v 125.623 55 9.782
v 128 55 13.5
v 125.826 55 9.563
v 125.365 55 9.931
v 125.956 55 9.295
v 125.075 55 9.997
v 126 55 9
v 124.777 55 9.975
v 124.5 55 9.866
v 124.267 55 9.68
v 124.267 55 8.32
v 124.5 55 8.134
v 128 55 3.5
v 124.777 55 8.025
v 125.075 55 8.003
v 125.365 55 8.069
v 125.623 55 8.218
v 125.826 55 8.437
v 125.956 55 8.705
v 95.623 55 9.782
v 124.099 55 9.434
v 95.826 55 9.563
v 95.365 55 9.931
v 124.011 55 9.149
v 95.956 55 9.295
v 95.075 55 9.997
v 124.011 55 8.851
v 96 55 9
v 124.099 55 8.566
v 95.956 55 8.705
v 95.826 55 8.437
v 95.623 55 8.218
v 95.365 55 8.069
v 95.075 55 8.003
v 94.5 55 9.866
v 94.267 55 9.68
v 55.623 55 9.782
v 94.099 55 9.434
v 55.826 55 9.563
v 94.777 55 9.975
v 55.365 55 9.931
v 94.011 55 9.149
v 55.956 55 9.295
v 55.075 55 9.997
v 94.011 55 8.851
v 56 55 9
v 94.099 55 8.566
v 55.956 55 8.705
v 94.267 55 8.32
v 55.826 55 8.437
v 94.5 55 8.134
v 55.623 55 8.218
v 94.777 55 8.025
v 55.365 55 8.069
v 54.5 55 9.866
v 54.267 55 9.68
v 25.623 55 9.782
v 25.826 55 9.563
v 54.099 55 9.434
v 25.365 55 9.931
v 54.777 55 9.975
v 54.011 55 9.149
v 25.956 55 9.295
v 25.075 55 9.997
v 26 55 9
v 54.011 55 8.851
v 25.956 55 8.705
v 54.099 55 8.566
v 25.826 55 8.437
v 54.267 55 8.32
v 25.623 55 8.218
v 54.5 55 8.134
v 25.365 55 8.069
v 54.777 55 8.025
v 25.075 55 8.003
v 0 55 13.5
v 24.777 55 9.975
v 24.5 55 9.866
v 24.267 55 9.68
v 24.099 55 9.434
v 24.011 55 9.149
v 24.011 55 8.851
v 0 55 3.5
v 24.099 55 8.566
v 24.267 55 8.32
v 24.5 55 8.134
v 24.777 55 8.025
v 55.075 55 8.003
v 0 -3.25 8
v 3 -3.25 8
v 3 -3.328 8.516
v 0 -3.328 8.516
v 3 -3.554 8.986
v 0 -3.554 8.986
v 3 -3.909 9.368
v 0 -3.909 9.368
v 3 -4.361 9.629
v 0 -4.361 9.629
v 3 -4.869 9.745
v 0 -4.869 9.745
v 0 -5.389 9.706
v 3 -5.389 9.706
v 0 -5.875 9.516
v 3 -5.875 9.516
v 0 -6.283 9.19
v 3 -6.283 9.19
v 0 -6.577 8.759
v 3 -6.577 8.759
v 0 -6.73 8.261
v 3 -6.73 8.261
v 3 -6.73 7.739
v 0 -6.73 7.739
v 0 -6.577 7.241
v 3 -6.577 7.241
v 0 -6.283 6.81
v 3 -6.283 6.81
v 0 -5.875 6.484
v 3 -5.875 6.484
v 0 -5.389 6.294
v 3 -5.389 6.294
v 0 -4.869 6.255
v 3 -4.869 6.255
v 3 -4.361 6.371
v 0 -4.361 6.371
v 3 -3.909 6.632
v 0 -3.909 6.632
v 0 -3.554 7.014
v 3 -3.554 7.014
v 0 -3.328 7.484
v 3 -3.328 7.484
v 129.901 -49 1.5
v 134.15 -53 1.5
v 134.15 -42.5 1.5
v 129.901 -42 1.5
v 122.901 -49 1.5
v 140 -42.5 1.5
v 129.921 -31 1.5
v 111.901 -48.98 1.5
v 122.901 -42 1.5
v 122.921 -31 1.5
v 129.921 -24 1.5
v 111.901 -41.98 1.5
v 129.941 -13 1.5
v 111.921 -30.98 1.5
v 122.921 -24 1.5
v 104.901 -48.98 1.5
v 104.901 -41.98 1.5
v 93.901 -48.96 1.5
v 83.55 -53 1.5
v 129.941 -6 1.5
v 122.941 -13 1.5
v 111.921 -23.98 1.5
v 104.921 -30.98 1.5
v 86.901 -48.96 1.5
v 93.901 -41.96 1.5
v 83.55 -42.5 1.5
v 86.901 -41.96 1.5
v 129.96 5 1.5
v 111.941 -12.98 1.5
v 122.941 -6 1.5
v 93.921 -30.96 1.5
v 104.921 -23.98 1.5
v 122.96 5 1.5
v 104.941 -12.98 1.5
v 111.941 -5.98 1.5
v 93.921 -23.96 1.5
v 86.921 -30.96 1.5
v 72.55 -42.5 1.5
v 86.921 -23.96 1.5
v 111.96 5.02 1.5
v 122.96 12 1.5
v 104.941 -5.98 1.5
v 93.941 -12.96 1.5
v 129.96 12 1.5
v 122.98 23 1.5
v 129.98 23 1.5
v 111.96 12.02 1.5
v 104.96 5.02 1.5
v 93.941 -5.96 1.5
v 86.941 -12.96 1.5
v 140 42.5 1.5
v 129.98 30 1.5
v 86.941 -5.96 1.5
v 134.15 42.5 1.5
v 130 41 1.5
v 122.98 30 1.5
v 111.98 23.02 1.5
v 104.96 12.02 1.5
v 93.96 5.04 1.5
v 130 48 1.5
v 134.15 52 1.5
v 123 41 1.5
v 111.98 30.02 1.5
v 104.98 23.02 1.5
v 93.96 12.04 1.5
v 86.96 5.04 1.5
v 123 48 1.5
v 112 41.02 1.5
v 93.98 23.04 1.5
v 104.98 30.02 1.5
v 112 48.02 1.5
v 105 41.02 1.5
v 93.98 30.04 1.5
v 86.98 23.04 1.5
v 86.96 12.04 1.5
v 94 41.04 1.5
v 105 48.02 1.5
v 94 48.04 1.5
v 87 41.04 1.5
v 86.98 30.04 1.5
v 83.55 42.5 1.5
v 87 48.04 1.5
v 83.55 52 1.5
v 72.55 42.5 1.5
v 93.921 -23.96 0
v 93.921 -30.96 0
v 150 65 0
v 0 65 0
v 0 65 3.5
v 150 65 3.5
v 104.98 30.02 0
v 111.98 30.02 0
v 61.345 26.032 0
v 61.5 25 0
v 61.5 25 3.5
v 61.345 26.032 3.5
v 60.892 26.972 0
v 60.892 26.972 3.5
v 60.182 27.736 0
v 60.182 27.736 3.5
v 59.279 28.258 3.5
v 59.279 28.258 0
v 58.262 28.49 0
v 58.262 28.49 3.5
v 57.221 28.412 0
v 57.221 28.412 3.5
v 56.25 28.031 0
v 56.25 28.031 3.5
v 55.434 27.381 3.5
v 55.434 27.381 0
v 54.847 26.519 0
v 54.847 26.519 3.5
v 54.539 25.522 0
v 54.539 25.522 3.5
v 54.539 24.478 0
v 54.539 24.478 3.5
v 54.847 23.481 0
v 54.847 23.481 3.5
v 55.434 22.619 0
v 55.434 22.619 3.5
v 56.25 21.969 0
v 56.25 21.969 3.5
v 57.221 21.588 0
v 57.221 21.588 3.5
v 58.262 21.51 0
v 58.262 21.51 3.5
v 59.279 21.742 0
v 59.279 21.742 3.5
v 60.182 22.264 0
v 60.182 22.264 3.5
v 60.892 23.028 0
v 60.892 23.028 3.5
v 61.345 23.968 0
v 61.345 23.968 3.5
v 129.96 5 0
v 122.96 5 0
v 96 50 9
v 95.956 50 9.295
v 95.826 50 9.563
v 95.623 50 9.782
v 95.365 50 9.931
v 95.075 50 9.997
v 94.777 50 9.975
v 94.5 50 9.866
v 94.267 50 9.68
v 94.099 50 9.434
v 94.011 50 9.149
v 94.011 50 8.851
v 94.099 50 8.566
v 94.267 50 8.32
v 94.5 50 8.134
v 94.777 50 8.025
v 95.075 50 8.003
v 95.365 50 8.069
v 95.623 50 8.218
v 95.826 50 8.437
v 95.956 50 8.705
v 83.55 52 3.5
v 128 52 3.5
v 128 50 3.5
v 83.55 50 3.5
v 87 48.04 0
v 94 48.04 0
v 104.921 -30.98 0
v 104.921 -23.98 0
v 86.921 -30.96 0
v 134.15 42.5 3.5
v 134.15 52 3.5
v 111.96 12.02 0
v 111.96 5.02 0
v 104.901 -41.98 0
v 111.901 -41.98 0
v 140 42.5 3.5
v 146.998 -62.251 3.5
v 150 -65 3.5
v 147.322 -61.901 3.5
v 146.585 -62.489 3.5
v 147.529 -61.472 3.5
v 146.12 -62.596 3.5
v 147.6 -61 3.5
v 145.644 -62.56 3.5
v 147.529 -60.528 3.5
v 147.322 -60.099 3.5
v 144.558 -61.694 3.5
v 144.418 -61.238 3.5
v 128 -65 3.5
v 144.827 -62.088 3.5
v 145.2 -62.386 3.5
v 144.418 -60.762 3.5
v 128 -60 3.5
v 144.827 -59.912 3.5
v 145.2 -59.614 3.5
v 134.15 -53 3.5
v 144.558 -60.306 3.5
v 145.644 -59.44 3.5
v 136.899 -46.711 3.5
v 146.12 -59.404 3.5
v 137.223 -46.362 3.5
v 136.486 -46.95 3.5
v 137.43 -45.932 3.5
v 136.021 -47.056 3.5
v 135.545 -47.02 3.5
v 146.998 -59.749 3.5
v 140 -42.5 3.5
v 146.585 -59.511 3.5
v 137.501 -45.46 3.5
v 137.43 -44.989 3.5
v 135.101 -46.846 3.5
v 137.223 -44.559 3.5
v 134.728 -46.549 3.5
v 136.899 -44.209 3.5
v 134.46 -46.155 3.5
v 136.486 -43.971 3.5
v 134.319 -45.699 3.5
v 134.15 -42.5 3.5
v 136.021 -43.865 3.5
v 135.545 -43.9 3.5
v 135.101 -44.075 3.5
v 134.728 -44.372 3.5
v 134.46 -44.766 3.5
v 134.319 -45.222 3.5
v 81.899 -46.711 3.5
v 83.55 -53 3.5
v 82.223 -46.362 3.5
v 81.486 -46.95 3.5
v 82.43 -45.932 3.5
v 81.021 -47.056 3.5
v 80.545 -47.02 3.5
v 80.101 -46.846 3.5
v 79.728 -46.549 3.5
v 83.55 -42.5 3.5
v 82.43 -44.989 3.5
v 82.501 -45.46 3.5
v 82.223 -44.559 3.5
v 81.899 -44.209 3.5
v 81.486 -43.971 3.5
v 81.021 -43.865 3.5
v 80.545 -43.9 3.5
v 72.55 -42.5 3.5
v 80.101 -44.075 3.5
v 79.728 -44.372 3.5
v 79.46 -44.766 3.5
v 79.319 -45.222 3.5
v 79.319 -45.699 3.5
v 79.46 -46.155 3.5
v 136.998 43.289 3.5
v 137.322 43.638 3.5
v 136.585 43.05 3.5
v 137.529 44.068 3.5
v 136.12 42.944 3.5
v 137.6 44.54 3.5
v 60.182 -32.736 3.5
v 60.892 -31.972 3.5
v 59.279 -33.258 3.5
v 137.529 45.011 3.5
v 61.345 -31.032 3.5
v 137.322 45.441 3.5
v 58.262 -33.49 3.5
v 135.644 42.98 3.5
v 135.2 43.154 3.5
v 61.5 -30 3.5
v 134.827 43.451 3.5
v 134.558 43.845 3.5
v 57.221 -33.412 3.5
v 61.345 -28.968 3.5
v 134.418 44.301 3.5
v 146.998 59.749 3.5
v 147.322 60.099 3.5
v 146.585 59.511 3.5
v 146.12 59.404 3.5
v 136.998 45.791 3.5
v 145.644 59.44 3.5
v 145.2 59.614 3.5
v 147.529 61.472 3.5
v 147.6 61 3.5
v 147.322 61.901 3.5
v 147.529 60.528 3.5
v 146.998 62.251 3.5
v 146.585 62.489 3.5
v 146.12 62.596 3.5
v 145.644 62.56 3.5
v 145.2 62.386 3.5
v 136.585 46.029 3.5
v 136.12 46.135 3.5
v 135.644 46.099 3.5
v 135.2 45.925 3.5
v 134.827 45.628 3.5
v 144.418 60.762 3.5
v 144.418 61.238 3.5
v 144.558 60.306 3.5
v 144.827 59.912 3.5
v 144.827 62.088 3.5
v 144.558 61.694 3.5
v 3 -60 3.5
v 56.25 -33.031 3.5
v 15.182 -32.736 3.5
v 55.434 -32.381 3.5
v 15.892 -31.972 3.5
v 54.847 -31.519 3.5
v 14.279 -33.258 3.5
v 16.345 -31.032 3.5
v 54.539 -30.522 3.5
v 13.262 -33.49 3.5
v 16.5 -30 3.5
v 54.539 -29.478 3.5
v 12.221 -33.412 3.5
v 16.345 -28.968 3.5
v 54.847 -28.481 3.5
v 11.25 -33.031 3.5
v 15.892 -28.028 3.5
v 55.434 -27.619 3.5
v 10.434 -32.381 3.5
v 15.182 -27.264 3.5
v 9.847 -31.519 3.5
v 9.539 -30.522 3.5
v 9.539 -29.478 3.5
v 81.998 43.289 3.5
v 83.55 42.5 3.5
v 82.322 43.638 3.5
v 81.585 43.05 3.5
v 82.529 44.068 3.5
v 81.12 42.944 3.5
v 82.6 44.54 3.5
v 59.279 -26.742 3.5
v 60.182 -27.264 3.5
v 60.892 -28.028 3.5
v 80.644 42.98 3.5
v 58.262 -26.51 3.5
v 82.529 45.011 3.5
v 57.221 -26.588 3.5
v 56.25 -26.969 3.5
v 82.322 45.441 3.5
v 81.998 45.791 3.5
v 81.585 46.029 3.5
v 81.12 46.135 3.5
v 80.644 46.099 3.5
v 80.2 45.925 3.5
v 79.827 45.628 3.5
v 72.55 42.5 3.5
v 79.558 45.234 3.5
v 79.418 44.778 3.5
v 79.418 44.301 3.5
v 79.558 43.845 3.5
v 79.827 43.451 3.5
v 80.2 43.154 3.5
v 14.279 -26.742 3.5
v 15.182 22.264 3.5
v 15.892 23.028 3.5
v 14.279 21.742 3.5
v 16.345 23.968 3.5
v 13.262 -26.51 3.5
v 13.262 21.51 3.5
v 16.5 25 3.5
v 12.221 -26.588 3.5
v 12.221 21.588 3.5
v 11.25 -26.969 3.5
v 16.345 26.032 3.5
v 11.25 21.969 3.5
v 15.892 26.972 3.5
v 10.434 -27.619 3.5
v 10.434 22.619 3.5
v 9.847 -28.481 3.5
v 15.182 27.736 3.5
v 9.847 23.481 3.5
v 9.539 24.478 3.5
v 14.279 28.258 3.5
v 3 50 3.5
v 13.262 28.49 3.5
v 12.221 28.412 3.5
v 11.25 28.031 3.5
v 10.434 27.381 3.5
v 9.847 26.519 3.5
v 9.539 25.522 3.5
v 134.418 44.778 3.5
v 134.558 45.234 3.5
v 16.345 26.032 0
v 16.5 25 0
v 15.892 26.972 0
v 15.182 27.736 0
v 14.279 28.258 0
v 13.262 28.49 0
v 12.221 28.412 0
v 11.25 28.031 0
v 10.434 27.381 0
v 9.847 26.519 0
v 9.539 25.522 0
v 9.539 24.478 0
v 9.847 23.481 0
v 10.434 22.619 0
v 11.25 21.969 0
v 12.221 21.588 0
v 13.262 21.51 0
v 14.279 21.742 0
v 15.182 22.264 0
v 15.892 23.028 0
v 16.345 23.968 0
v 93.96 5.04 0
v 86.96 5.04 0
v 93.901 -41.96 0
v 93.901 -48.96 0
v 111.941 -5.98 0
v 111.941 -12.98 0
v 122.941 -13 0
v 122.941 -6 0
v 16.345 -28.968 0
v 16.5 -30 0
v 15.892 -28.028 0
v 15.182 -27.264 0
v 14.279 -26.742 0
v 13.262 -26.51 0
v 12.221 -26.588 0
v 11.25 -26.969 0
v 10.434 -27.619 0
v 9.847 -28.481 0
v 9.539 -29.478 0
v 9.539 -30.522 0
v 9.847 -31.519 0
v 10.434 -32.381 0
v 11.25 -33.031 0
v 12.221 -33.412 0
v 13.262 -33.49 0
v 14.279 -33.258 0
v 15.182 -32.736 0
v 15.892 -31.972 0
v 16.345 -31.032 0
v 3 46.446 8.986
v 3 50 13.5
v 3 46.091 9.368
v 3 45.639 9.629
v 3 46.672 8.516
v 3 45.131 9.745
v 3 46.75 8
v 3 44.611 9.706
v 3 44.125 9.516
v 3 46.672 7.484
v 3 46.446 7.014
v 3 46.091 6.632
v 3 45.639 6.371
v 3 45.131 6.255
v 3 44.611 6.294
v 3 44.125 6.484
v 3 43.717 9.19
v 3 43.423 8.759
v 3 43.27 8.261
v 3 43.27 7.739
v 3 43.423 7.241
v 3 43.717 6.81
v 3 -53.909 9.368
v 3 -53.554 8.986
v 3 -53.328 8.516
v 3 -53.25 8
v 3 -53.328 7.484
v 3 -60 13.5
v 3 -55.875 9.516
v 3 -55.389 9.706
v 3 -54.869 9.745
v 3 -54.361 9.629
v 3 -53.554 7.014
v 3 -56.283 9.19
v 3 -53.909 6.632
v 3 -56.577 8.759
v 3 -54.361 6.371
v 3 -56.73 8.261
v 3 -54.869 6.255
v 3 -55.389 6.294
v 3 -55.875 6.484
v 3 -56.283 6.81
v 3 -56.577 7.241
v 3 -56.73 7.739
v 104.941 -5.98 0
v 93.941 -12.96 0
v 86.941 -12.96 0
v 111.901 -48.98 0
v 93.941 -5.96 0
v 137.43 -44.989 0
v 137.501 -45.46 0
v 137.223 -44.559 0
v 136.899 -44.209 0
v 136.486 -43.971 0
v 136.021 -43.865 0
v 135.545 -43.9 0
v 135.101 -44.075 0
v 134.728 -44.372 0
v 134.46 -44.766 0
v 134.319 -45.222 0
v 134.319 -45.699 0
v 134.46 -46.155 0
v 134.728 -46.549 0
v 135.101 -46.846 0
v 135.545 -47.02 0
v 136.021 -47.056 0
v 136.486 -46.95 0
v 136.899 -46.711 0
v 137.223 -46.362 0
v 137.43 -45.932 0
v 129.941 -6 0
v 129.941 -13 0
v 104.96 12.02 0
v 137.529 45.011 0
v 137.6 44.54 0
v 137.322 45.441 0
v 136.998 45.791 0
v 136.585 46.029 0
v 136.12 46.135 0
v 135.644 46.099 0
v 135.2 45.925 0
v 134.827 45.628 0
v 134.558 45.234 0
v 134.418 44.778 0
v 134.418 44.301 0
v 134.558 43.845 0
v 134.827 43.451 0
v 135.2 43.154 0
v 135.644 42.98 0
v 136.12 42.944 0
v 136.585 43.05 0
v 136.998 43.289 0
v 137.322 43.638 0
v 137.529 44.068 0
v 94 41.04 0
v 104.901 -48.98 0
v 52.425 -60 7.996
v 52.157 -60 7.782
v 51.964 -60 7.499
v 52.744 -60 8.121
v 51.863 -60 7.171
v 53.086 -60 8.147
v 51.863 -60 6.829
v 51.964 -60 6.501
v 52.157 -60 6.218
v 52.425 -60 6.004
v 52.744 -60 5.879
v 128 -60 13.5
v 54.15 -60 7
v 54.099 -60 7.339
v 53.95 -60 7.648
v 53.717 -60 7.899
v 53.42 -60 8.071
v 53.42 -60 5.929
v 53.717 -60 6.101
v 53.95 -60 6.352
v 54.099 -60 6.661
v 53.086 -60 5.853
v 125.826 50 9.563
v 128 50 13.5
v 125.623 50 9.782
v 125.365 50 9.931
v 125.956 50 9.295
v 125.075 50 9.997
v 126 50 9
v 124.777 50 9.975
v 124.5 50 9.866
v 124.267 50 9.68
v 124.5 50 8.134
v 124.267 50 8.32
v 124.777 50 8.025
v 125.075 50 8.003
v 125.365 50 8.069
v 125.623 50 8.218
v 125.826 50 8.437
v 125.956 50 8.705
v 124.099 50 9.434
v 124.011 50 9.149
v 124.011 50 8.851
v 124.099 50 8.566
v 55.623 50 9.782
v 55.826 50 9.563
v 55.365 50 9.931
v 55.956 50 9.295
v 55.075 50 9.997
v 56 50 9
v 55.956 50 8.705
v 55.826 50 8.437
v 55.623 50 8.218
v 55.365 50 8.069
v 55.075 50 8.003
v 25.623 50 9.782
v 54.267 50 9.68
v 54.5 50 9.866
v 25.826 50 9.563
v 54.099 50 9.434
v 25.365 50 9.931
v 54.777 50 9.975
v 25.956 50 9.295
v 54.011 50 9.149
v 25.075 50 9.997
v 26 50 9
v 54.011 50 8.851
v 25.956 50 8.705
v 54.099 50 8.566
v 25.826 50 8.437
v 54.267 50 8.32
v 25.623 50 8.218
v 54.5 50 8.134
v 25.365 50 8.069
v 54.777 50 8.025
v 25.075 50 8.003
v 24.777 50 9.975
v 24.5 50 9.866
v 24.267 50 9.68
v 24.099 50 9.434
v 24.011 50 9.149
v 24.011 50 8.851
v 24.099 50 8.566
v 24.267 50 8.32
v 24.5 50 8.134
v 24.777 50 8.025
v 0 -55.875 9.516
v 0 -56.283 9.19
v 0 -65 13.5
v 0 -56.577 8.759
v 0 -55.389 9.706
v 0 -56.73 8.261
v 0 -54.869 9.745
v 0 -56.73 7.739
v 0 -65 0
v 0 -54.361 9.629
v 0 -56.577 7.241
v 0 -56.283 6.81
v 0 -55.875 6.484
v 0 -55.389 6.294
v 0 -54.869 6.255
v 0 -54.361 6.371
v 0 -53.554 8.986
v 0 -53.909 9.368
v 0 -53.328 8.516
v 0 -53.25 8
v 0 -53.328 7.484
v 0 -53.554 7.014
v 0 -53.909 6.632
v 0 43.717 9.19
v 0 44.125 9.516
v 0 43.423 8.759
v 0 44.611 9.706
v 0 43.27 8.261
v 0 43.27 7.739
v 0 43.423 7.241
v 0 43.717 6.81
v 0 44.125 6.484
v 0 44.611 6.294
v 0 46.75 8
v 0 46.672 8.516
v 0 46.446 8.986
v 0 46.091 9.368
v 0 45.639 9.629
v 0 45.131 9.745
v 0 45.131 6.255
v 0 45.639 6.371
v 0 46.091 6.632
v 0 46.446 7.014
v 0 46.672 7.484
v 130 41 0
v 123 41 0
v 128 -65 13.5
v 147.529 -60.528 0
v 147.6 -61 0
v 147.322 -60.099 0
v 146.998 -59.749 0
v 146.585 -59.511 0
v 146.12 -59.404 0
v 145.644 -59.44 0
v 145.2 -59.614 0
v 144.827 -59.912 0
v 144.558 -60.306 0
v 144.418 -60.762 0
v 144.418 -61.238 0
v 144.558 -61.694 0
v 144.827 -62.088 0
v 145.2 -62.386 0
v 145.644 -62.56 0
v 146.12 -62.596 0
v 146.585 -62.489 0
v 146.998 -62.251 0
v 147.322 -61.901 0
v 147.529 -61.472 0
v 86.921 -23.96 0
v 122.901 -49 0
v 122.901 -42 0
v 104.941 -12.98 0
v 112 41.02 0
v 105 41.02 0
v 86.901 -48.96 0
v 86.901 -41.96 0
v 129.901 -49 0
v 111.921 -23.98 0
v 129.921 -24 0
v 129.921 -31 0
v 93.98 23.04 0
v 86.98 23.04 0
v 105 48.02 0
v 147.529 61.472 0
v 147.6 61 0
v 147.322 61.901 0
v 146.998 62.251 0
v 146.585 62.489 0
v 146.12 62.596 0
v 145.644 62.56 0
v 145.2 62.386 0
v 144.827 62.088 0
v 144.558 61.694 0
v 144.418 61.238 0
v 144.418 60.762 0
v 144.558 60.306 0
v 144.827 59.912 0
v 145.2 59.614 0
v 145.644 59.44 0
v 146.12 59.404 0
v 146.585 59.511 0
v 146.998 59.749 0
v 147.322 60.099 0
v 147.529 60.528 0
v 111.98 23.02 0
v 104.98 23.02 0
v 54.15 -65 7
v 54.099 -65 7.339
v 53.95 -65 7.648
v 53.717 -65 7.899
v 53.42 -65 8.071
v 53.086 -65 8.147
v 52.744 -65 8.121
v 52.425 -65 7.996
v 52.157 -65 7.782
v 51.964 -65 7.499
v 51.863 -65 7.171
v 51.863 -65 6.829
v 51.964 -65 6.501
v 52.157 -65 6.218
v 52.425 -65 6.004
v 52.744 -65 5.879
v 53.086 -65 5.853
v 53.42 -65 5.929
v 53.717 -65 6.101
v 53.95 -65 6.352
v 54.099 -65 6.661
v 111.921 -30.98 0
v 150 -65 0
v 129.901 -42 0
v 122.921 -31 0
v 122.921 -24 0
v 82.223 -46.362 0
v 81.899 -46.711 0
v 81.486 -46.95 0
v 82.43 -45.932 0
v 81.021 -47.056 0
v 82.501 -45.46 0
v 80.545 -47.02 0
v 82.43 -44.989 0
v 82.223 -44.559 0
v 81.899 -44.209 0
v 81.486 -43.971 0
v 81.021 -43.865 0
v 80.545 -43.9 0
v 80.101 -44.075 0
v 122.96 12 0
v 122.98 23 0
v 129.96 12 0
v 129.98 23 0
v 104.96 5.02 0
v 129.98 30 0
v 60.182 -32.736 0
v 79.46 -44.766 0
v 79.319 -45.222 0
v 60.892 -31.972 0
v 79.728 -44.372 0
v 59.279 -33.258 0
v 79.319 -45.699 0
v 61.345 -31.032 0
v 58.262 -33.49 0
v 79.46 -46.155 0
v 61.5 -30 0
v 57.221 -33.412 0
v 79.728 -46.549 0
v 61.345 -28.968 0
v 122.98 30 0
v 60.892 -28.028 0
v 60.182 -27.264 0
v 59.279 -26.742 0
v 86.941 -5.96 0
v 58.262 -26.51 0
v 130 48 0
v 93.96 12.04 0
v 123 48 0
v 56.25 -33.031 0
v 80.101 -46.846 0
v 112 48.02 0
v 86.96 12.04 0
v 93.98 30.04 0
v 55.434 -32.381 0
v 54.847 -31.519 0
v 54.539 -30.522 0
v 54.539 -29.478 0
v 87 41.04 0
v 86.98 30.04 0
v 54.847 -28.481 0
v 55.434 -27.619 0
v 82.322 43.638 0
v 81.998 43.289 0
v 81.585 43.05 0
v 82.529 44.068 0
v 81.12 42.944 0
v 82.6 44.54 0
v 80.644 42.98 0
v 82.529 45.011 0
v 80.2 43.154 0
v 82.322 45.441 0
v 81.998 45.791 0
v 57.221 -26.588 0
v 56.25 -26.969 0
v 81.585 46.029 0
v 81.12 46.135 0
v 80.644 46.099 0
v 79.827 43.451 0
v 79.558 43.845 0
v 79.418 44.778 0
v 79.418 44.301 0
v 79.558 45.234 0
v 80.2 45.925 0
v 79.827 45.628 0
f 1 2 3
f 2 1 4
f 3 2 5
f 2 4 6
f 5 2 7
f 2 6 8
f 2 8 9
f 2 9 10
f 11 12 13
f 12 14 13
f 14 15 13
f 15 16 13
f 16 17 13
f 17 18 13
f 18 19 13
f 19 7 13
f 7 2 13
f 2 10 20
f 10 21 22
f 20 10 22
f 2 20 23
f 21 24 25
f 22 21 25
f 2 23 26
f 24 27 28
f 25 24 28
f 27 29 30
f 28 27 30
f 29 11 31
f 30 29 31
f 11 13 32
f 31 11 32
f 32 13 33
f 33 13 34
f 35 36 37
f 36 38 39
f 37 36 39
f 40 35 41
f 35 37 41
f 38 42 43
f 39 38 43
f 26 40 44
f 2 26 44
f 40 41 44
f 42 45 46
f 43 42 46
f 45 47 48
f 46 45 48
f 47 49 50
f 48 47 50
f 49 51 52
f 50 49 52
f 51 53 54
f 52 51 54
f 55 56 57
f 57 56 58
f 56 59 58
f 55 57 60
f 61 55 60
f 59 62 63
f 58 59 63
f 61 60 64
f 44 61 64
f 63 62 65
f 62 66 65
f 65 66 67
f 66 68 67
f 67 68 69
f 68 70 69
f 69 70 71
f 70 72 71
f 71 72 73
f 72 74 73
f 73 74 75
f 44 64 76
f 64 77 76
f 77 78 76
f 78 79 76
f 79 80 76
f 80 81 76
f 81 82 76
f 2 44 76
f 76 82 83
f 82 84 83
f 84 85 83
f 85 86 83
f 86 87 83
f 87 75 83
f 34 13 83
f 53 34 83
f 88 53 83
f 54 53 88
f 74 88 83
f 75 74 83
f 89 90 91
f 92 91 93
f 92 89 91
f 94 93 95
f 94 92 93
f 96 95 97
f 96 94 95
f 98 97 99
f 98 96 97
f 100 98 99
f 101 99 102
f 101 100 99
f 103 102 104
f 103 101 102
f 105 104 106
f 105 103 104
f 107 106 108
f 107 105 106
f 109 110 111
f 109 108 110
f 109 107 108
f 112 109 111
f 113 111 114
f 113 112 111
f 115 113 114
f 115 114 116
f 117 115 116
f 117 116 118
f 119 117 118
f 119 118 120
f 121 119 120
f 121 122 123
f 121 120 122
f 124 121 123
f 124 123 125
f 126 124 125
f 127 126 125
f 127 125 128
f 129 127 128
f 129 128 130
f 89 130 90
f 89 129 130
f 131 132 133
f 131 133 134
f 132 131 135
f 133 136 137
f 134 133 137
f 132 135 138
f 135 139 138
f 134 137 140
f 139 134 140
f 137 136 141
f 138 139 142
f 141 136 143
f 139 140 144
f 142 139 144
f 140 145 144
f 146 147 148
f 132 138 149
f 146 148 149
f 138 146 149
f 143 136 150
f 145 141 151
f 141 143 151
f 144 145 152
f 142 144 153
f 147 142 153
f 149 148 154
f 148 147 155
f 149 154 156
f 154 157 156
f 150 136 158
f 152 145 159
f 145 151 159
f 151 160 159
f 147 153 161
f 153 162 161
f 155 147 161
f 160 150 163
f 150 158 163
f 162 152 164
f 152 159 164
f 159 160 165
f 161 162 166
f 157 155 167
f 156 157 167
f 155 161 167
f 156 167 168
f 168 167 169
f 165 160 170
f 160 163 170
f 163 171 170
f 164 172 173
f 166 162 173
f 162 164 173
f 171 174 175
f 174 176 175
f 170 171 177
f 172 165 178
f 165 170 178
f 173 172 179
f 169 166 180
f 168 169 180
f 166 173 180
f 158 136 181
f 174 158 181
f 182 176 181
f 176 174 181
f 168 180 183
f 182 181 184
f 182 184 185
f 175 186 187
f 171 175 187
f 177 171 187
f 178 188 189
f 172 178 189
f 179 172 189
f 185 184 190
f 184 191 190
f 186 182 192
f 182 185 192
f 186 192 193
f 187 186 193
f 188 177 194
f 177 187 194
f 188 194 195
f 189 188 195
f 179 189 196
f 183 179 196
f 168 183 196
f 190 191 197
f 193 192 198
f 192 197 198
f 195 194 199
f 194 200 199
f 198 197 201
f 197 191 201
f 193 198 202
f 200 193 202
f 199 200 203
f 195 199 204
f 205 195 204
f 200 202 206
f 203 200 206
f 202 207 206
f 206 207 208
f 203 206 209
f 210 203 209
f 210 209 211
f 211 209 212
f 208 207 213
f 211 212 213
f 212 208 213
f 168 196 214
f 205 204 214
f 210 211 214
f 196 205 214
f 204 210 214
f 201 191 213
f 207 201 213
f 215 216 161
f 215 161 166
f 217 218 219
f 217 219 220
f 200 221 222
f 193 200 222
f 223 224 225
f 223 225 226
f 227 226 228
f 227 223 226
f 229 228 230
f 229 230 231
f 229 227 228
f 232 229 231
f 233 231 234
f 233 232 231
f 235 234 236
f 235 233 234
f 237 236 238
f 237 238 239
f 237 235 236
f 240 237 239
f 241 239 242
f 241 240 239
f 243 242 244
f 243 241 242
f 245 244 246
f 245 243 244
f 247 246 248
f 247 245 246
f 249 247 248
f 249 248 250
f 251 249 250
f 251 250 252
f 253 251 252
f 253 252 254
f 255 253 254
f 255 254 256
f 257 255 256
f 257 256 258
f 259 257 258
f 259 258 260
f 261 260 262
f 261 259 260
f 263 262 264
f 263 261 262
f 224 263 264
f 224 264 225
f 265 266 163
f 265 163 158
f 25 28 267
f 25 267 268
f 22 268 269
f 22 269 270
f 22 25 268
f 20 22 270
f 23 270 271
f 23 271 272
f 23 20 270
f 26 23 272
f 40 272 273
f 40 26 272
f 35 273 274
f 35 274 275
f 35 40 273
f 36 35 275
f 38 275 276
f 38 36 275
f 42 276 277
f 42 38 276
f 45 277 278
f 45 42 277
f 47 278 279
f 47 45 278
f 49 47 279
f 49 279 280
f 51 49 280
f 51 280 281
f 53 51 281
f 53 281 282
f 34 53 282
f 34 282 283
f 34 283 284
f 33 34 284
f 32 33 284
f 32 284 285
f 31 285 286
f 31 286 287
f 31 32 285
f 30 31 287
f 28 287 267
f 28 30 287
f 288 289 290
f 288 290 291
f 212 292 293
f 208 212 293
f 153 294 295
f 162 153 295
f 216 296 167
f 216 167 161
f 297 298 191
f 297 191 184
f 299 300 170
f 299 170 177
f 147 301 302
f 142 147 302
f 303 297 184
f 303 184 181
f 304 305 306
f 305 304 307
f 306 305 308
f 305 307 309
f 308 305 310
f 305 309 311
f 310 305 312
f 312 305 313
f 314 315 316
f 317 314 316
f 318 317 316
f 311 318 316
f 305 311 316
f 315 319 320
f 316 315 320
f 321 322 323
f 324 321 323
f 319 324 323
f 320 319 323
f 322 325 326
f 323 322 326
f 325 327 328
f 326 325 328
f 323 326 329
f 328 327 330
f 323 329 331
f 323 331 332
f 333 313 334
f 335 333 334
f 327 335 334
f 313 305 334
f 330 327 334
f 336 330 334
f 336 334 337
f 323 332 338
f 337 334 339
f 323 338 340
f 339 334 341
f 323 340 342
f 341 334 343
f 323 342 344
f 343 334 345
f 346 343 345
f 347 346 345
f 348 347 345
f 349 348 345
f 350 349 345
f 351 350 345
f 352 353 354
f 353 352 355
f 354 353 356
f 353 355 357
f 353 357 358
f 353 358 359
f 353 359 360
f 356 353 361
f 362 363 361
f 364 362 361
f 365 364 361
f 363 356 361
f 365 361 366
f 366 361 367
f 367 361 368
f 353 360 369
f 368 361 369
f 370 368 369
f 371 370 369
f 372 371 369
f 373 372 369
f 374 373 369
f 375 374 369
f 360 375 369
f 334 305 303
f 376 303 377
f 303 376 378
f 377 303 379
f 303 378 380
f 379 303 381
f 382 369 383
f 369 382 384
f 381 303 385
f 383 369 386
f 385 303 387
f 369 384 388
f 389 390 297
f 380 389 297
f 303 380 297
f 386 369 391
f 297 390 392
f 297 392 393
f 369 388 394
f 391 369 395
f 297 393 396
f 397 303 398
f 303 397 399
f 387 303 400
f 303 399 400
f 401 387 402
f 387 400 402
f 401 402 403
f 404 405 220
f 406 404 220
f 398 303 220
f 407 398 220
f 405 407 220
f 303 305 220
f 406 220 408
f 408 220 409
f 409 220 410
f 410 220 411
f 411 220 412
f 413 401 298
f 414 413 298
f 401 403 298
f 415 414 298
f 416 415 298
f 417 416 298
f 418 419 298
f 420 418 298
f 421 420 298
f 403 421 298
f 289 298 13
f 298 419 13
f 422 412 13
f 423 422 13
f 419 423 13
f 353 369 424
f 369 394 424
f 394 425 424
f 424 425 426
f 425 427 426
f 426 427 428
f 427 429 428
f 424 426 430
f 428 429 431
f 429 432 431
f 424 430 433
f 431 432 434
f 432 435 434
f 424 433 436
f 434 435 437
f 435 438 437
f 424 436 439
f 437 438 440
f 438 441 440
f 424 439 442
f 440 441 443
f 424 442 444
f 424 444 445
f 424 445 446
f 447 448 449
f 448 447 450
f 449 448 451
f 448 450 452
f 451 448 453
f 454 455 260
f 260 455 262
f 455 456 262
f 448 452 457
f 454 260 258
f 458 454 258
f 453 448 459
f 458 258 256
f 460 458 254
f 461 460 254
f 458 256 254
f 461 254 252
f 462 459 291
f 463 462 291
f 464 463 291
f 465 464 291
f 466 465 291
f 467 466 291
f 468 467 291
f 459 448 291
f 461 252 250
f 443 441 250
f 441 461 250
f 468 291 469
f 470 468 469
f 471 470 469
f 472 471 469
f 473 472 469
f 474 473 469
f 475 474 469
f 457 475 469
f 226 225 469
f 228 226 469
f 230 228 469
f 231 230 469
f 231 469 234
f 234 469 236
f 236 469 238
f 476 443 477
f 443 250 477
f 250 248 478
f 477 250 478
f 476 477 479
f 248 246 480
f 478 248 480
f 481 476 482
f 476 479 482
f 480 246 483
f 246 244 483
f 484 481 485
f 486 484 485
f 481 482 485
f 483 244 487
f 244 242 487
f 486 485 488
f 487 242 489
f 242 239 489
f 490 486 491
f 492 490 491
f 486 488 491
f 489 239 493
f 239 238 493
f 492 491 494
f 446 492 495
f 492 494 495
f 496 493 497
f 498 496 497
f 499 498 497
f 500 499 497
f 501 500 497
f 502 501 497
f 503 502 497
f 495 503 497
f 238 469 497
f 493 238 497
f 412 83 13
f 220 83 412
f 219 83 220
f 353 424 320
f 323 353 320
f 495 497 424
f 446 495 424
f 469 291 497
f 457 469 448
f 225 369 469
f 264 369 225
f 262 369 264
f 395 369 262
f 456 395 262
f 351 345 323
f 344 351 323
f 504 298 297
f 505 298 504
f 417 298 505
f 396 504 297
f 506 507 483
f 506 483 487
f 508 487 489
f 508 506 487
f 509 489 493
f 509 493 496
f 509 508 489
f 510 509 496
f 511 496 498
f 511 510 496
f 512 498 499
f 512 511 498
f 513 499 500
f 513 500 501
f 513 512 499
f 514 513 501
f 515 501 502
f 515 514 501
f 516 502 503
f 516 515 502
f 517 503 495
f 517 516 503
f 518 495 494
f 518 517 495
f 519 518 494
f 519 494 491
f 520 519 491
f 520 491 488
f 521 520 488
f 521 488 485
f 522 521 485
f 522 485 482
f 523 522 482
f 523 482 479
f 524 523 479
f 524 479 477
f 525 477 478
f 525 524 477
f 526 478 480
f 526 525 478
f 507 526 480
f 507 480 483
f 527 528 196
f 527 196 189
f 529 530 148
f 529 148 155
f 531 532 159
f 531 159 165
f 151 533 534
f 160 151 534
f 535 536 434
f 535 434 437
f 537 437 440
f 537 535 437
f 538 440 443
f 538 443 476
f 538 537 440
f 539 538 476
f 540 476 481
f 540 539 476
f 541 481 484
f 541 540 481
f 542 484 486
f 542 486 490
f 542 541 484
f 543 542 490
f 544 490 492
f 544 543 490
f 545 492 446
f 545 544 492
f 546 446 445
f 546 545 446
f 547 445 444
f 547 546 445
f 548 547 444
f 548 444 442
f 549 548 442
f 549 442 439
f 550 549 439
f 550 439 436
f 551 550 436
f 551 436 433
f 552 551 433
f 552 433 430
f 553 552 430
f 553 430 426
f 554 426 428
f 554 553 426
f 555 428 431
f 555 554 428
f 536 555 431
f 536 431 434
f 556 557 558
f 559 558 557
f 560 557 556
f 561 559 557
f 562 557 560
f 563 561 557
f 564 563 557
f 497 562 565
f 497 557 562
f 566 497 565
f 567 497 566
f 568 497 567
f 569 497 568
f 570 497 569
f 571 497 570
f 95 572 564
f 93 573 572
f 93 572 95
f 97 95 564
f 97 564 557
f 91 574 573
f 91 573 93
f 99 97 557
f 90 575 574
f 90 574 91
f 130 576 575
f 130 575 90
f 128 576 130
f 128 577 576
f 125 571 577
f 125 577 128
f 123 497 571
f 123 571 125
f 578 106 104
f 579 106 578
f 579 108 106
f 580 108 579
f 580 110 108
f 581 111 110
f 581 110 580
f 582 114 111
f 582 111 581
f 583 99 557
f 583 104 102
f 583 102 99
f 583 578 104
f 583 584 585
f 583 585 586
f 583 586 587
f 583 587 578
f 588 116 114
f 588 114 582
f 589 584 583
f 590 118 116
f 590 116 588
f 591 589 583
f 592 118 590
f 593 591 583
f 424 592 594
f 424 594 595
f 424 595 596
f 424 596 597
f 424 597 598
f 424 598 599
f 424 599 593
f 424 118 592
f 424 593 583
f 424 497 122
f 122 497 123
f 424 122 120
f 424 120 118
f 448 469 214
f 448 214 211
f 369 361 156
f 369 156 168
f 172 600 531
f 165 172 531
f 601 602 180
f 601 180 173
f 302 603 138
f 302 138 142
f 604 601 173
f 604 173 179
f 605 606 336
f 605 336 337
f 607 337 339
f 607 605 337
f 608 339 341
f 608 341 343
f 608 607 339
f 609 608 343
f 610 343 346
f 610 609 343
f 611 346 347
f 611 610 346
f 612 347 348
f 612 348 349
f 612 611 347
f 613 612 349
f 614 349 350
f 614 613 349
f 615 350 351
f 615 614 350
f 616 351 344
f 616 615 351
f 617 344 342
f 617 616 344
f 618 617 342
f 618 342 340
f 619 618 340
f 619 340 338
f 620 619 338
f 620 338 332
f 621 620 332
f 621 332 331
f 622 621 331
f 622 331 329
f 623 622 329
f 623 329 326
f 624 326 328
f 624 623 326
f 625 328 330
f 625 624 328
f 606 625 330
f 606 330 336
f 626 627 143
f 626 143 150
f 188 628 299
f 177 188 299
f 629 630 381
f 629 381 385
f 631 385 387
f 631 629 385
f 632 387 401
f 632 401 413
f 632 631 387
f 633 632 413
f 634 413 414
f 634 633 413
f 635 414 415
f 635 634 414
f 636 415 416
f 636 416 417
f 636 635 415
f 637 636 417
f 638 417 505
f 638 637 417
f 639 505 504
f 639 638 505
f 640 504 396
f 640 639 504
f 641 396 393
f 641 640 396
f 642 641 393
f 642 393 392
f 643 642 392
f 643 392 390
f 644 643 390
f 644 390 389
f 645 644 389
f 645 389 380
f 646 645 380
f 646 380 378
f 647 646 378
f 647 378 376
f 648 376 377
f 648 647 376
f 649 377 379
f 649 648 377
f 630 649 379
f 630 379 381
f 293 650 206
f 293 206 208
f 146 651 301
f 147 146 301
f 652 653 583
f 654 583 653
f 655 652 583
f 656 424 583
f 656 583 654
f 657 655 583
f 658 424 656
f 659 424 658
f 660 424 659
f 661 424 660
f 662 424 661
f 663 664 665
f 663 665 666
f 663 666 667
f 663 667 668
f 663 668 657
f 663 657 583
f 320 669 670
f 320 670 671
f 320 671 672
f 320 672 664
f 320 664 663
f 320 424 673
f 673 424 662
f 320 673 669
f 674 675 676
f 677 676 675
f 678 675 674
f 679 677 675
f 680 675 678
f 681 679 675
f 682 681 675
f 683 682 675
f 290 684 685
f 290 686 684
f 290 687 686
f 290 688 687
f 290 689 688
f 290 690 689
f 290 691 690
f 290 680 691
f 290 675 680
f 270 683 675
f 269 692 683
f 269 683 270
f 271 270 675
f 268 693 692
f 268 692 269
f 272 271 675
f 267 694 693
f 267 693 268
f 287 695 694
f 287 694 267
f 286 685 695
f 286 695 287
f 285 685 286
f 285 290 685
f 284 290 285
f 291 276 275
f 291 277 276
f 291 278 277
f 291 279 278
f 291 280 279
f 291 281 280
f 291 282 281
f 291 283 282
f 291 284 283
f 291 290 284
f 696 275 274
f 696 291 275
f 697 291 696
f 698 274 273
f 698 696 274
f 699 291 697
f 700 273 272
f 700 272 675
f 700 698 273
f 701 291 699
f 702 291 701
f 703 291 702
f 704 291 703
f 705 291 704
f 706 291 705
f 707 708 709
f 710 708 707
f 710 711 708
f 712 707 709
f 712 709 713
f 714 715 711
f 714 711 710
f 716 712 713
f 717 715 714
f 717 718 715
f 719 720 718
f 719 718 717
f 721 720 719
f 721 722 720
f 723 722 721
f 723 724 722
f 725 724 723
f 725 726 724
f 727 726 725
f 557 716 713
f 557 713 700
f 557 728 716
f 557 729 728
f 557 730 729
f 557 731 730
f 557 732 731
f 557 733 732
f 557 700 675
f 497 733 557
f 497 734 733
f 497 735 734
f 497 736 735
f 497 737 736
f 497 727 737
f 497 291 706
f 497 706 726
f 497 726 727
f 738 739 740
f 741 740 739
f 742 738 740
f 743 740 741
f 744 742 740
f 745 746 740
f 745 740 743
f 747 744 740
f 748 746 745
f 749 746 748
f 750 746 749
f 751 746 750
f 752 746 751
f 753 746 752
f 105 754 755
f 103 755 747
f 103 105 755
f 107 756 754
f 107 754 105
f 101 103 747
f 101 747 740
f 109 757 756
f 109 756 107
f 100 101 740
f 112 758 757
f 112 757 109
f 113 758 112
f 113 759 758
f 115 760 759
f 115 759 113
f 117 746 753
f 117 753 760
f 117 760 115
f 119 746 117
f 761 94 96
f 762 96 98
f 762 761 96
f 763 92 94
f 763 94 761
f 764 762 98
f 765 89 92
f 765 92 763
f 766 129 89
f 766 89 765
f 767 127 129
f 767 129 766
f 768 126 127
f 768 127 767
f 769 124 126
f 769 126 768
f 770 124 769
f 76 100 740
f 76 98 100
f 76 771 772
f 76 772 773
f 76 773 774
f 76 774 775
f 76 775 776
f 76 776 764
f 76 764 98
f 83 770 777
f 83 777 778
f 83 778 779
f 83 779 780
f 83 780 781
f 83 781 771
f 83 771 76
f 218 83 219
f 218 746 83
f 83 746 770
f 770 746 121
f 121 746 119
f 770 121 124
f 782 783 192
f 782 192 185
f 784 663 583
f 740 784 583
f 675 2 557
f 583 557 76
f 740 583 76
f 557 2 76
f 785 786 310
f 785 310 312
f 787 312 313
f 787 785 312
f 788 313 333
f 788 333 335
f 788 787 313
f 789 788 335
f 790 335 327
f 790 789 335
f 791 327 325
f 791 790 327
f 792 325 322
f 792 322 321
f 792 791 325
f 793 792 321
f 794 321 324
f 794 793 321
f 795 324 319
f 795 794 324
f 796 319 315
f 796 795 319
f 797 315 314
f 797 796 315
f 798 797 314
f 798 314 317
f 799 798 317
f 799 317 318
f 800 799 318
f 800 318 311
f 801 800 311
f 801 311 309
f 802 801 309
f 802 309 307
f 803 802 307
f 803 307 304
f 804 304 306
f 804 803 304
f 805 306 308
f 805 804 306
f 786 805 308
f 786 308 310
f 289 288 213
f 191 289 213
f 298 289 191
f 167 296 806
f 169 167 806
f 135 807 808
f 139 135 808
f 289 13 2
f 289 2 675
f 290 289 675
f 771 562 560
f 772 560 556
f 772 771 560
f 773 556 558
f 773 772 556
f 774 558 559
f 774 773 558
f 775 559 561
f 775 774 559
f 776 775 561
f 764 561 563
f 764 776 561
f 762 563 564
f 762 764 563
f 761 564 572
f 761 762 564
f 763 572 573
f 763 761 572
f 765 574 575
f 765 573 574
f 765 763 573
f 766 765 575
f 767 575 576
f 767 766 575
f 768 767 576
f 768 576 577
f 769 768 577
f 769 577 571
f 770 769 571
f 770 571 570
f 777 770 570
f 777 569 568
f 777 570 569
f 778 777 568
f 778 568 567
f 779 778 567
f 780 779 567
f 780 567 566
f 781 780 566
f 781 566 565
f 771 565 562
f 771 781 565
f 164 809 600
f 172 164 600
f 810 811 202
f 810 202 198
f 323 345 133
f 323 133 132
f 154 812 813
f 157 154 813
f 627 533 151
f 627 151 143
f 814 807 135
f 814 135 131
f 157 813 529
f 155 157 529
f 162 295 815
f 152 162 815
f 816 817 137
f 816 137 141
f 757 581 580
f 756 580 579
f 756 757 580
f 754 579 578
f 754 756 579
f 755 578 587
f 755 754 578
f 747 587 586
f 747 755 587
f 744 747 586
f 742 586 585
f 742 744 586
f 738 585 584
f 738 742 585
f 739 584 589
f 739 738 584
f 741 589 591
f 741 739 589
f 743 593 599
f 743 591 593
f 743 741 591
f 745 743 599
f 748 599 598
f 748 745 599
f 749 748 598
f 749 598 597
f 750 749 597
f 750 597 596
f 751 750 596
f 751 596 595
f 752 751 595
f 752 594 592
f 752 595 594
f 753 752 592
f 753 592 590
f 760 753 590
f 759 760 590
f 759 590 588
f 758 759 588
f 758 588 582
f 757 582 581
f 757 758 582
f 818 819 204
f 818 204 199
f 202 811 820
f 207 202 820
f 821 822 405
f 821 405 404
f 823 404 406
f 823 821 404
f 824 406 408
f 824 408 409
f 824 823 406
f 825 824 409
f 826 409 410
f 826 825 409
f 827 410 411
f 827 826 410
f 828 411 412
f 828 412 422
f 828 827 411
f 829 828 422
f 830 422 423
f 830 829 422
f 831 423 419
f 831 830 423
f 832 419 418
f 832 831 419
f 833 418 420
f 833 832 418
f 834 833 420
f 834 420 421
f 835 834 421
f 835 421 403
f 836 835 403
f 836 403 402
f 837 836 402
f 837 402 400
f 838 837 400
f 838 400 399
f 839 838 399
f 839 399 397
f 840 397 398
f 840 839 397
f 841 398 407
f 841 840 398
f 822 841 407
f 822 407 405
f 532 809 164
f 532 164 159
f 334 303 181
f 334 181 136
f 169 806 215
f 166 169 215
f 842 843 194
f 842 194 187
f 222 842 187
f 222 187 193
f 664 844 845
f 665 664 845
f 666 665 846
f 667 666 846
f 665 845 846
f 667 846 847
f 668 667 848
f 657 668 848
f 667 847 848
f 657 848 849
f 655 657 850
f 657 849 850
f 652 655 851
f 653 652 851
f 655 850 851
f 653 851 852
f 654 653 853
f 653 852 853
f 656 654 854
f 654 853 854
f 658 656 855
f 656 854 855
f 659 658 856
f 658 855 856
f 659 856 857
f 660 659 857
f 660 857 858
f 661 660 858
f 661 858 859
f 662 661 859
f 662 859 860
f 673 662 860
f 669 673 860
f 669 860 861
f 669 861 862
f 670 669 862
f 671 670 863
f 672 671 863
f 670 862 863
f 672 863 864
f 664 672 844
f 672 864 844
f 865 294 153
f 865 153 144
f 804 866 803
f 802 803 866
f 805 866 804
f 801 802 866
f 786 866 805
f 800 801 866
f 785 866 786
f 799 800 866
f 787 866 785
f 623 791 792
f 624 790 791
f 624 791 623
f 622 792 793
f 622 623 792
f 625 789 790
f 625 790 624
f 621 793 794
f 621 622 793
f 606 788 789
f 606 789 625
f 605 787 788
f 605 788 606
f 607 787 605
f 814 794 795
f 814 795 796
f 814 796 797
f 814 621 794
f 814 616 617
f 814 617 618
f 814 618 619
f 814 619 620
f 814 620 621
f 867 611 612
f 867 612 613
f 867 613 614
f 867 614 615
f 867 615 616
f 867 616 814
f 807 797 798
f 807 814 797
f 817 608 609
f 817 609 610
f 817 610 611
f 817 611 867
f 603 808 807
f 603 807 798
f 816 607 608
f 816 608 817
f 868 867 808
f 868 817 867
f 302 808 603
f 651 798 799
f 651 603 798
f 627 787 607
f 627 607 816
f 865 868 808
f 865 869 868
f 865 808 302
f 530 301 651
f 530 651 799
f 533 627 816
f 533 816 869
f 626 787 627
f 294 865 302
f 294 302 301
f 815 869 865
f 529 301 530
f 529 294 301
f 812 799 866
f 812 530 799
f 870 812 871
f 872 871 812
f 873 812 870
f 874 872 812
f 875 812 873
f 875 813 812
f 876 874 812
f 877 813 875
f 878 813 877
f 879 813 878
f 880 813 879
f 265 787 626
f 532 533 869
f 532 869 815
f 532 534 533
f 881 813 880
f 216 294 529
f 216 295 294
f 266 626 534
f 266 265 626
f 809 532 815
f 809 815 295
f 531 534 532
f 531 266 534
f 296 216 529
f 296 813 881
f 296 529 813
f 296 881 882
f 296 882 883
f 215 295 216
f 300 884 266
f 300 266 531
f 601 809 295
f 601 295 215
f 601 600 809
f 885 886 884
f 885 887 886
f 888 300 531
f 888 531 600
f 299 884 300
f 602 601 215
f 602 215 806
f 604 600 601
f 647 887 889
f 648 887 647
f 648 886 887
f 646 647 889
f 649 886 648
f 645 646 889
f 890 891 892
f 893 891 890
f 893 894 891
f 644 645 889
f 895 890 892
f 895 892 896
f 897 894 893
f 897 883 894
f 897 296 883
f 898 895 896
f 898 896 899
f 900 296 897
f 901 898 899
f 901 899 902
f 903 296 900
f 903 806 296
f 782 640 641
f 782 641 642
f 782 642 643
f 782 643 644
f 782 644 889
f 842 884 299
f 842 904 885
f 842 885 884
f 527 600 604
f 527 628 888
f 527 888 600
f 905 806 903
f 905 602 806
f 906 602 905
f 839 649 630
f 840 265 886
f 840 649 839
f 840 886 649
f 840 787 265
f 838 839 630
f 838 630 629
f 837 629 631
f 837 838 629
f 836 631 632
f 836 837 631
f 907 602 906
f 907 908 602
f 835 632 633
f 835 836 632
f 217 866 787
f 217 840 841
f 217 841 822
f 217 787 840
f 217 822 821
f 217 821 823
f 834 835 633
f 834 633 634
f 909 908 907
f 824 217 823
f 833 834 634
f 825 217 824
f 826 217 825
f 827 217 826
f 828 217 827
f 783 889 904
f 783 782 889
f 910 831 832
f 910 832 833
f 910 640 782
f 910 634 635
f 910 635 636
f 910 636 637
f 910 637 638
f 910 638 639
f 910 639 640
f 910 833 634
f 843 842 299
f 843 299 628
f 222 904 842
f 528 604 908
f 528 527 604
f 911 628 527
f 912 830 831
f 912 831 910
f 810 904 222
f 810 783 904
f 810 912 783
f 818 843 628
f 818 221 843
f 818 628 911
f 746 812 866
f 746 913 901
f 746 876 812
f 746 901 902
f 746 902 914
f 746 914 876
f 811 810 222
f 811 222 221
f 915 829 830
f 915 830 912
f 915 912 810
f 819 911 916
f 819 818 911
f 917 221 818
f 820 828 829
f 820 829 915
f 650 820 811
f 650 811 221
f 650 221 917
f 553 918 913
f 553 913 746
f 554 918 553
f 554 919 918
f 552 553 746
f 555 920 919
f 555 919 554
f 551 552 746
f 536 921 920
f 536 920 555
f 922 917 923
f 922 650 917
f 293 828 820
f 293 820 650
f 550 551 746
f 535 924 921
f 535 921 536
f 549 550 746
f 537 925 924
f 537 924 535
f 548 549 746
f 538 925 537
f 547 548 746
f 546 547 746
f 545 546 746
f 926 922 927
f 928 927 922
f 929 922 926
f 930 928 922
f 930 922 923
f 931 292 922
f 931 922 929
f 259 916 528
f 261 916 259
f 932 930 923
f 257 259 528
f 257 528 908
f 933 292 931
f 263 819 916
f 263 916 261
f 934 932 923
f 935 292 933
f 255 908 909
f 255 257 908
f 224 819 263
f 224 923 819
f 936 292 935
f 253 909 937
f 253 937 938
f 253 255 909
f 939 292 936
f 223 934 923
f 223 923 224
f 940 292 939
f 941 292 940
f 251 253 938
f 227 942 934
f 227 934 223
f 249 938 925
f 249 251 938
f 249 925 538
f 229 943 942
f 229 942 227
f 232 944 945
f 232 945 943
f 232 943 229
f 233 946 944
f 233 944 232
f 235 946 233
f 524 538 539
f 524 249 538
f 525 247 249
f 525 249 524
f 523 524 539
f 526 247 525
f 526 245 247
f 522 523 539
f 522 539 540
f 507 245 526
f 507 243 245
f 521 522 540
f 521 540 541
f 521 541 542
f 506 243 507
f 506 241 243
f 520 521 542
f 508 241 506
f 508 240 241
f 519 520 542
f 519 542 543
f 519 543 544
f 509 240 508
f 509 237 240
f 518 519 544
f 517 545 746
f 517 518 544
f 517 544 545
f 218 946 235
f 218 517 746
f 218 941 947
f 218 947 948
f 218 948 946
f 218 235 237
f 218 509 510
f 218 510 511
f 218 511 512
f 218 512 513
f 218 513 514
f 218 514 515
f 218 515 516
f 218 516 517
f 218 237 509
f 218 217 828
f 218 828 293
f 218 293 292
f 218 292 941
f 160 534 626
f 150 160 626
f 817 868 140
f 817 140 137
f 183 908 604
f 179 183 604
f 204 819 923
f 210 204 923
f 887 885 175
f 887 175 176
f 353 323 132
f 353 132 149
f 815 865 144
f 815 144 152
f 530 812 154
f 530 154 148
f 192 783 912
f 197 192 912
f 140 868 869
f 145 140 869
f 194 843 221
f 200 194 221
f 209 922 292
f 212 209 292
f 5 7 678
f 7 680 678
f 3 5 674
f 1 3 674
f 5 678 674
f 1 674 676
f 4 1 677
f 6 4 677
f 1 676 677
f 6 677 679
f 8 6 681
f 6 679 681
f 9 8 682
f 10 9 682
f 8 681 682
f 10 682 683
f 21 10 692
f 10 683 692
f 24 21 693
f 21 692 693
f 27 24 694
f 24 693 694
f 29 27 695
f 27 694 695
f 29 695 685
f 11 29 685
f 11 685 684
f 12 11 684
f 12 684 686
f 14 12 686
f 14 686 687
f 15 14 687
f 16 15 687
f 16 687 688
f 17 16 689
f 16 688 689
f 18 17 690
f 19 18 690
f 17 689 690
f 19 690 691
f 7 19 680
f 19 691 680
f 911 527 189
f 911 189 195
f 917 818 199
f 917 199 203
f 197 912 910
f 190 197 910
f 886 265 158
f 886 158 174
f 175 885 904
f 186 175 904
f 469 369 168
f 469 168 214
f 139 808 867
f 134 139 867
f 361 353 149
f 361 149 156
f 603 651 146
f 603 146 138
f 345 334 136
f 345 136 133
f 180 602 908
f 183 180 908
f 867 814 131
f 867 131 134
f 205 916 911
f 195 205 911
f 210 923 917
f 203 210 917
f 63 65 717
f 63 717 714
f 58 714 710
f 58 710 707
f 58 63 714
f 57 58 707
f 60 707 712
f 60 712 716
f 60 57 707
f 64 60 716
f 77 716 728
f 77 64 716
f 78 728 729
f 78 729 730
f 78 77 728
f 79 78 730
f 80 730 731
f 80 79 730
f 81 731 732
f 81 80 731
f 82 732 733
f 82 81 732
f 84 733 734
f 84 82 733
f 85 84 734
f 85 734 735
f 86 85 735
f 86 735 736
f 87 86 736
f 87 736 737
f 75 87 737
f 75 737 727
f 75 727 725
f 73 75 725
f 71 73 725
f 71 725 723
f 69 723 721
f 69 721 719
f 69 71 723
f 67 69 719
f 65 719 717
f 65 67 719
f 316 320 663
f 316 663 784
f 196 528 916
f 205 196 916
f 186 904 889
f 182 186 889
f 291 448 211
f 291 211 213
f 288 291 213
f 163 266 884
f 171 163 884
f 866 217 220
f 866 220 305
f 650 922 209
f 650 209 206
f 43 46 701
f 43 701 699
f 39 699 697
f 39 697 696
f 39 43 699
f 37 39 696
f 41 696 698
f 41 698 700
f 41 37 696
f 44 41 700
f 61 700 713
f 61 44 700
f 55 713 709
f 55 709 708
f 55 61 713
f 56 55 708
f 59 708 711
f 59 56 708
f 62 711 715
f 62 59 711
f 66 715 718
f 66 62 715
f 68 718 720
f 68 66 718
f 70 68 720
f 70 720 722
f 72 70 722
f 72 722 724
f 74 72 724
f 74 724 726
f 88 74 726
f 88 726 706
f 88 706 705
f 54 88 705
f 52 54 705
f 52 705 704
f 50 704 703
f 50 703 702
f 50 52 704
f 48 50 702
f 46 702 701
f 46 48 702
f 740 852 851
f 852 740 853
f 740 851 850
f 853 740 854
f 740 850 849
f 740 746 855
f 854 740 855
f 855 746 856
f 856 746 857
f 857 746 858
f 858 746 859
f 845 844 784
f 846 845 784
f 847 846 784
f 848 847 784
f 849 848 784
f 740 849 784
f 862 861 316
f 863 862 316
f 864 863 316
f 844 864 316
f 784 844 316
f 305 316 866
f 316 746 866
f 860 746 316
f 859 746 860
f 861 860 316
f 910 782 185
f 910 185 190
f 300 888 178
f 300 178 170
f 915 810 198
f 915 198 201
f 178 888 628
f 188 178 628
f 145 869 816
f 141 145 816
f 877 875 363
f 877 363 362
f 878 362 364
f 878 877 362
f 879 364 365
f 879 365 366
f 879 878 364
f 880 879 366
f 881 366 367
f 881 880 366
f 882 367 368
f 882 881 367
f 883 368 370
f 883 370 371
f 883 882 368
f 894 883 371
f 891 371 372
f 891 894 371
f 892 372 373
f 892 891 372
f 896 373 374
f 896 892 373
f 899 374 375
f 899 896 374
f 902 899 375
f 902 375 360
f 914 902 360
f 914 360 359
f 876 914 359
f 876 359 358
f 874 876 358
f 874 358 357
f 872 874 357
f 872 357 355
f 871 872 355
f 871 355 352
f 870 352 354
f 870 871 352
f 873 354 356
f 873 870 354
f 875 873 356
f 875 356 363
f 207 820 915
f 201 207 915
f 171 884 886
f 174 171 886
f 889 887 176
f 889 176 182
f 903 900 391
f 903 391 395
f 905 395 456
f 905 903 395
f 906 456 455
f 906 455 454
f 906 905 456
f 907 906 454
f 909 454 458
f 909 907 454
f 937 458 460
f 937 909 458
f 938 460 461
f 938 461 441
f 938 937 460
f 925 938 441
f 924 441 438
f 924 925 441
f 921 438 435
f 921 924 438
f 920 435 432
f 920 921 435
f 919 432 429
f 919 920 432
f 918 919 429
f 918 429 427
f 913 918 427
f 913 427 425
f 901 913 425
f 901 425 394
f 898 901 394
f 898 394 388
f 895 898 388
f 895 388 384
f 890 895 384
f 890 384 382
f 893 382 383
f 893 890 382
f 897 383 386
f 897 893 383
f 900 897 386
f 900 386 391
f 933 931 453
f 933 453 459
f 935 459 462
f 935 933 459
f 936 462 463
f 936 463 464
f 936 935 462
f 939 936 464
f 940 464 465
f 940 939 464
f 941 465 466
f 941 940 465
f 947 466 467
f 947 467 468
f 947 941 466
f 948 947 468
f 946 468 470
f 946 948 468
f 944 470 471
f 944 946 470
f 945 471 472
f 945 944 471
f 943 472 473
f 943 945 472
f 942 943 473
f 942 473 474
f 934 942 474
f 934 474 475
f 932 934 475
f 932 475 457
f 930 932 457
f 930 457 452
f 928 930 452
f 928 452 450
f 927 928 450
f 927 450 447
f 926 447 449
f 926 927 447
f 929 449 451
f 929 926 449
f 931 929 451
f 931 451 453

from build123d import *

# Parameters (mm, degrees)
SKETCH013_R     = 3.5
SKETCH013_R_2   = 1.6
SKETCH013_W     = 7
SKETCH013_H     = 7
PAD004_DEPTH    = 3.5
PAD_DEPTH       = 10
SKETCH015_R     = 1.15
POCKET005_DEPTH = 5
SKETCH004_R     = 1
POCKET006_DEPTH = 5
SKETCH014_R     = 1.75
POCKET007_DEPTH = 5
POCKET_DEPTH    = 2


with BuildPart() as part:
    # Sketch013 → Pad004 (new body)
    with BuildSketch(Plane.XY):
        Polygon((0, 65), (150, 65.000002), (150, -65), (0, -65), align=None)
        with Locations((13, 25)):
            Circle(SKETCH013_R, mode=Mode.SUBTRACT)
        with Locations((58, 25)):
            Circle(SKETCH013_R, mode=Mode.SUBTRACT)
        with Locations((13, -30)):
            Circle(SKETCH013_R, mode=Mode.SUBTRACT)
        with Locations((58, -30)):
            Circle(SKETCH013_R, mode=Mode.SUBTRACT)
        with Locations((146, 61.000002)):
            Circle(SKETCH013_R_2, mode=Mode.SUBTRACT)
        with Locations((146, -61)):
            Circle(SKETCH013_R_2, mode=Mode.SUBTRACT)
        with Locations((81.000022, 44.539576)):
            Circle(SKETCH013_R_2, mode=Mode.SUBTRACT)
        with Locations((136, 44.539576)):
            Circle(SKETCH013_R_2, mode=Mode.SUBTRACT)
        with Locations((80.901087, -45.46037)):
            Circle(SKETCH013_R_2, mode=Mode.SUBTRACT)
        with Locations((135.901066, -45.46037)):
            Circle(SKETCH013_R_2, mode=Mode.SUBTRACT)
        with Locations((90.500022, 44.539576)):
            Rectangle(SKETCH013_W, SKETCH013_H, mode=Mode.SUBTRACT)
        with Locations((108.500011, 44.519789)):
            Rectangle(SKETCH013_W, SKETCH013_H, mode=Mode.SUBTRACT)
        with Locations((126.5, 44.500002)):
            Rectangle(SKETCH013_W, SKETCH013_H, mode=Mode.SUBTRACT)
        with Locations((90.480235, 26.539587)):
            Rectangle(SKETCH013_W, SKETCH013_H, mode=Mode.SUBTRACT)
        with Locations((108.480224, 26.5198)):
            Rectangle(SKETCH013_W, SKETCH013_H, mode=Mode.SUBTRACT)
        with Locations((126.480213, 26.500013)):
            Rectangle(SKETCH013_W, SKETCH013_H, mode=Mode.SUBTRACT)
        with Locations((90.460448, 8.539598)):
            Rectangle(SKETCH013_W, SKETCH013_H, mode=Mode.SUBTRACT)
        with Locations((108.460437, 8.519811)):
            Rectangle(SKETCH013_W, SKETCH013_H, mode=Mode.SUBTRACT)
        with Locations((126.460426, 8.500024)):
            Rectangle(SKETCH013_W, SKETCH013_H, mode=Mode.SUBTRACT)
        with Locations((90.440661, -9.460392)):
            Rectangle(SKETCH013_W, SKETCH013_H, mode=Mode.SUBTRACT)
        with Locations((108.44065, -9.480178)):
            Rectangle(SKETCH013_W, SKETCH013_H, mode=Mode.SUBTRACT)
        with Locations((126.440639, -9.499965)):
            Rectangle(SKETCH013_W, SKETCH013_H, mode=Mode.SUBTRACT)
        with Locations((90.420874, -27.460381)):
            Rectangle(SKETCH013_W, SKETCH013_H, mode=Mode.SUBTRACT)
        with Locations((108.420863, -27.480168)):
            Rectangle(SKETCH013_W, SKETCH013_H, mode=Mode.SUBTRACT)
        with Locations((126.420852, -27.499954)):
            Rectangle(SKETCH013_W, SKETCH013_H, mode=Mode.SUBTRACT)
        with Locations((90.401087, -45.46037)):
            Rectangle(SKETCH013_W, SKETCH013_H, mode=Mode.SUBTRACT)
        with Locations((108.401076, -45.480157)):
            Rectangle(SKETCH013_W, SKETCH013_H, mode=Mode.SUBTRACT)
        with Locations((126.401066, -45.499944)):
            Rectangle(SKETCH013_W, SKETCH013_H, mode=Mode.SUBTRACT)
    extrude(amount=PAD004_DEPTH)

    # Sketch001 → Pad (join)
    with BuildSketch(Plane.XY.offset(3.5)):
        Polygon((0, 55), (3, 55), (128, 55), (128, 50), (3, 50), (3, -60), (128, -60), (128, -65), (3, -65), (0, -65), align=None)
    extrude(amount=PAD_DEPTH)

    # Sketch015 → Pocket005 (cut)
    with BuildSketch(Plane.XZ.offset(65)):
        with Locations((53, 7)):
            Circle(SKETCH015_R)
    extrude(amount=-POCKET005_DEPTH, mode=Mode.SUBTRACT)

    # Sketch004 → Pocket006 (cut, symmetric)
    with BuildSketch(Plane.XZ.offset(-55)):
        with Locations((25, 9)):
            Circle(SKETCH004_R)
        with Locations((95, 9)):
            Circle(SKETCH004_R)
        with Locations((55, 9)):
            Circle(SKETCH004_R)
        with Locations((125, 9)):
            Circle(SKETCH004_R)
    extrude(amount=POCKET006_DEPTH, both=True, mode=Mode.SUBTRACT)

    # Sketch014 → Pocket007 (cut)
    with BuildSketch(Plane.YZ):
        with Locations((45, 8)):
            Circle(SKETCH014_R)
        with Locations((-5, 8)):
            Circle(SKETCH014_R)
        with Locations((-55, 8)):
            Circle(SKETCH014_R)
    extrude(amount=POCKET007_DEPTH, mode=Mode.SUBTRACT)

    # Sketch → Pocket (cut)
    with BuildSketch(Plane.XY.offset(3.5)):
        Polygon((83.55, 52), (134.15, 52), (134.15, 42.5), (140, 42.5), (140, -42.5), (134.15, -42.5), (134.15, -53), (83.55, -53), (83.55, -42.5), (72.55, -42.5), (72.55, 42.5), (83.55, 42.5), align=None)
    extrude(amount=-POCKET_DEPTH, mode=Mode.SUBTRACT)


solid = part.part
